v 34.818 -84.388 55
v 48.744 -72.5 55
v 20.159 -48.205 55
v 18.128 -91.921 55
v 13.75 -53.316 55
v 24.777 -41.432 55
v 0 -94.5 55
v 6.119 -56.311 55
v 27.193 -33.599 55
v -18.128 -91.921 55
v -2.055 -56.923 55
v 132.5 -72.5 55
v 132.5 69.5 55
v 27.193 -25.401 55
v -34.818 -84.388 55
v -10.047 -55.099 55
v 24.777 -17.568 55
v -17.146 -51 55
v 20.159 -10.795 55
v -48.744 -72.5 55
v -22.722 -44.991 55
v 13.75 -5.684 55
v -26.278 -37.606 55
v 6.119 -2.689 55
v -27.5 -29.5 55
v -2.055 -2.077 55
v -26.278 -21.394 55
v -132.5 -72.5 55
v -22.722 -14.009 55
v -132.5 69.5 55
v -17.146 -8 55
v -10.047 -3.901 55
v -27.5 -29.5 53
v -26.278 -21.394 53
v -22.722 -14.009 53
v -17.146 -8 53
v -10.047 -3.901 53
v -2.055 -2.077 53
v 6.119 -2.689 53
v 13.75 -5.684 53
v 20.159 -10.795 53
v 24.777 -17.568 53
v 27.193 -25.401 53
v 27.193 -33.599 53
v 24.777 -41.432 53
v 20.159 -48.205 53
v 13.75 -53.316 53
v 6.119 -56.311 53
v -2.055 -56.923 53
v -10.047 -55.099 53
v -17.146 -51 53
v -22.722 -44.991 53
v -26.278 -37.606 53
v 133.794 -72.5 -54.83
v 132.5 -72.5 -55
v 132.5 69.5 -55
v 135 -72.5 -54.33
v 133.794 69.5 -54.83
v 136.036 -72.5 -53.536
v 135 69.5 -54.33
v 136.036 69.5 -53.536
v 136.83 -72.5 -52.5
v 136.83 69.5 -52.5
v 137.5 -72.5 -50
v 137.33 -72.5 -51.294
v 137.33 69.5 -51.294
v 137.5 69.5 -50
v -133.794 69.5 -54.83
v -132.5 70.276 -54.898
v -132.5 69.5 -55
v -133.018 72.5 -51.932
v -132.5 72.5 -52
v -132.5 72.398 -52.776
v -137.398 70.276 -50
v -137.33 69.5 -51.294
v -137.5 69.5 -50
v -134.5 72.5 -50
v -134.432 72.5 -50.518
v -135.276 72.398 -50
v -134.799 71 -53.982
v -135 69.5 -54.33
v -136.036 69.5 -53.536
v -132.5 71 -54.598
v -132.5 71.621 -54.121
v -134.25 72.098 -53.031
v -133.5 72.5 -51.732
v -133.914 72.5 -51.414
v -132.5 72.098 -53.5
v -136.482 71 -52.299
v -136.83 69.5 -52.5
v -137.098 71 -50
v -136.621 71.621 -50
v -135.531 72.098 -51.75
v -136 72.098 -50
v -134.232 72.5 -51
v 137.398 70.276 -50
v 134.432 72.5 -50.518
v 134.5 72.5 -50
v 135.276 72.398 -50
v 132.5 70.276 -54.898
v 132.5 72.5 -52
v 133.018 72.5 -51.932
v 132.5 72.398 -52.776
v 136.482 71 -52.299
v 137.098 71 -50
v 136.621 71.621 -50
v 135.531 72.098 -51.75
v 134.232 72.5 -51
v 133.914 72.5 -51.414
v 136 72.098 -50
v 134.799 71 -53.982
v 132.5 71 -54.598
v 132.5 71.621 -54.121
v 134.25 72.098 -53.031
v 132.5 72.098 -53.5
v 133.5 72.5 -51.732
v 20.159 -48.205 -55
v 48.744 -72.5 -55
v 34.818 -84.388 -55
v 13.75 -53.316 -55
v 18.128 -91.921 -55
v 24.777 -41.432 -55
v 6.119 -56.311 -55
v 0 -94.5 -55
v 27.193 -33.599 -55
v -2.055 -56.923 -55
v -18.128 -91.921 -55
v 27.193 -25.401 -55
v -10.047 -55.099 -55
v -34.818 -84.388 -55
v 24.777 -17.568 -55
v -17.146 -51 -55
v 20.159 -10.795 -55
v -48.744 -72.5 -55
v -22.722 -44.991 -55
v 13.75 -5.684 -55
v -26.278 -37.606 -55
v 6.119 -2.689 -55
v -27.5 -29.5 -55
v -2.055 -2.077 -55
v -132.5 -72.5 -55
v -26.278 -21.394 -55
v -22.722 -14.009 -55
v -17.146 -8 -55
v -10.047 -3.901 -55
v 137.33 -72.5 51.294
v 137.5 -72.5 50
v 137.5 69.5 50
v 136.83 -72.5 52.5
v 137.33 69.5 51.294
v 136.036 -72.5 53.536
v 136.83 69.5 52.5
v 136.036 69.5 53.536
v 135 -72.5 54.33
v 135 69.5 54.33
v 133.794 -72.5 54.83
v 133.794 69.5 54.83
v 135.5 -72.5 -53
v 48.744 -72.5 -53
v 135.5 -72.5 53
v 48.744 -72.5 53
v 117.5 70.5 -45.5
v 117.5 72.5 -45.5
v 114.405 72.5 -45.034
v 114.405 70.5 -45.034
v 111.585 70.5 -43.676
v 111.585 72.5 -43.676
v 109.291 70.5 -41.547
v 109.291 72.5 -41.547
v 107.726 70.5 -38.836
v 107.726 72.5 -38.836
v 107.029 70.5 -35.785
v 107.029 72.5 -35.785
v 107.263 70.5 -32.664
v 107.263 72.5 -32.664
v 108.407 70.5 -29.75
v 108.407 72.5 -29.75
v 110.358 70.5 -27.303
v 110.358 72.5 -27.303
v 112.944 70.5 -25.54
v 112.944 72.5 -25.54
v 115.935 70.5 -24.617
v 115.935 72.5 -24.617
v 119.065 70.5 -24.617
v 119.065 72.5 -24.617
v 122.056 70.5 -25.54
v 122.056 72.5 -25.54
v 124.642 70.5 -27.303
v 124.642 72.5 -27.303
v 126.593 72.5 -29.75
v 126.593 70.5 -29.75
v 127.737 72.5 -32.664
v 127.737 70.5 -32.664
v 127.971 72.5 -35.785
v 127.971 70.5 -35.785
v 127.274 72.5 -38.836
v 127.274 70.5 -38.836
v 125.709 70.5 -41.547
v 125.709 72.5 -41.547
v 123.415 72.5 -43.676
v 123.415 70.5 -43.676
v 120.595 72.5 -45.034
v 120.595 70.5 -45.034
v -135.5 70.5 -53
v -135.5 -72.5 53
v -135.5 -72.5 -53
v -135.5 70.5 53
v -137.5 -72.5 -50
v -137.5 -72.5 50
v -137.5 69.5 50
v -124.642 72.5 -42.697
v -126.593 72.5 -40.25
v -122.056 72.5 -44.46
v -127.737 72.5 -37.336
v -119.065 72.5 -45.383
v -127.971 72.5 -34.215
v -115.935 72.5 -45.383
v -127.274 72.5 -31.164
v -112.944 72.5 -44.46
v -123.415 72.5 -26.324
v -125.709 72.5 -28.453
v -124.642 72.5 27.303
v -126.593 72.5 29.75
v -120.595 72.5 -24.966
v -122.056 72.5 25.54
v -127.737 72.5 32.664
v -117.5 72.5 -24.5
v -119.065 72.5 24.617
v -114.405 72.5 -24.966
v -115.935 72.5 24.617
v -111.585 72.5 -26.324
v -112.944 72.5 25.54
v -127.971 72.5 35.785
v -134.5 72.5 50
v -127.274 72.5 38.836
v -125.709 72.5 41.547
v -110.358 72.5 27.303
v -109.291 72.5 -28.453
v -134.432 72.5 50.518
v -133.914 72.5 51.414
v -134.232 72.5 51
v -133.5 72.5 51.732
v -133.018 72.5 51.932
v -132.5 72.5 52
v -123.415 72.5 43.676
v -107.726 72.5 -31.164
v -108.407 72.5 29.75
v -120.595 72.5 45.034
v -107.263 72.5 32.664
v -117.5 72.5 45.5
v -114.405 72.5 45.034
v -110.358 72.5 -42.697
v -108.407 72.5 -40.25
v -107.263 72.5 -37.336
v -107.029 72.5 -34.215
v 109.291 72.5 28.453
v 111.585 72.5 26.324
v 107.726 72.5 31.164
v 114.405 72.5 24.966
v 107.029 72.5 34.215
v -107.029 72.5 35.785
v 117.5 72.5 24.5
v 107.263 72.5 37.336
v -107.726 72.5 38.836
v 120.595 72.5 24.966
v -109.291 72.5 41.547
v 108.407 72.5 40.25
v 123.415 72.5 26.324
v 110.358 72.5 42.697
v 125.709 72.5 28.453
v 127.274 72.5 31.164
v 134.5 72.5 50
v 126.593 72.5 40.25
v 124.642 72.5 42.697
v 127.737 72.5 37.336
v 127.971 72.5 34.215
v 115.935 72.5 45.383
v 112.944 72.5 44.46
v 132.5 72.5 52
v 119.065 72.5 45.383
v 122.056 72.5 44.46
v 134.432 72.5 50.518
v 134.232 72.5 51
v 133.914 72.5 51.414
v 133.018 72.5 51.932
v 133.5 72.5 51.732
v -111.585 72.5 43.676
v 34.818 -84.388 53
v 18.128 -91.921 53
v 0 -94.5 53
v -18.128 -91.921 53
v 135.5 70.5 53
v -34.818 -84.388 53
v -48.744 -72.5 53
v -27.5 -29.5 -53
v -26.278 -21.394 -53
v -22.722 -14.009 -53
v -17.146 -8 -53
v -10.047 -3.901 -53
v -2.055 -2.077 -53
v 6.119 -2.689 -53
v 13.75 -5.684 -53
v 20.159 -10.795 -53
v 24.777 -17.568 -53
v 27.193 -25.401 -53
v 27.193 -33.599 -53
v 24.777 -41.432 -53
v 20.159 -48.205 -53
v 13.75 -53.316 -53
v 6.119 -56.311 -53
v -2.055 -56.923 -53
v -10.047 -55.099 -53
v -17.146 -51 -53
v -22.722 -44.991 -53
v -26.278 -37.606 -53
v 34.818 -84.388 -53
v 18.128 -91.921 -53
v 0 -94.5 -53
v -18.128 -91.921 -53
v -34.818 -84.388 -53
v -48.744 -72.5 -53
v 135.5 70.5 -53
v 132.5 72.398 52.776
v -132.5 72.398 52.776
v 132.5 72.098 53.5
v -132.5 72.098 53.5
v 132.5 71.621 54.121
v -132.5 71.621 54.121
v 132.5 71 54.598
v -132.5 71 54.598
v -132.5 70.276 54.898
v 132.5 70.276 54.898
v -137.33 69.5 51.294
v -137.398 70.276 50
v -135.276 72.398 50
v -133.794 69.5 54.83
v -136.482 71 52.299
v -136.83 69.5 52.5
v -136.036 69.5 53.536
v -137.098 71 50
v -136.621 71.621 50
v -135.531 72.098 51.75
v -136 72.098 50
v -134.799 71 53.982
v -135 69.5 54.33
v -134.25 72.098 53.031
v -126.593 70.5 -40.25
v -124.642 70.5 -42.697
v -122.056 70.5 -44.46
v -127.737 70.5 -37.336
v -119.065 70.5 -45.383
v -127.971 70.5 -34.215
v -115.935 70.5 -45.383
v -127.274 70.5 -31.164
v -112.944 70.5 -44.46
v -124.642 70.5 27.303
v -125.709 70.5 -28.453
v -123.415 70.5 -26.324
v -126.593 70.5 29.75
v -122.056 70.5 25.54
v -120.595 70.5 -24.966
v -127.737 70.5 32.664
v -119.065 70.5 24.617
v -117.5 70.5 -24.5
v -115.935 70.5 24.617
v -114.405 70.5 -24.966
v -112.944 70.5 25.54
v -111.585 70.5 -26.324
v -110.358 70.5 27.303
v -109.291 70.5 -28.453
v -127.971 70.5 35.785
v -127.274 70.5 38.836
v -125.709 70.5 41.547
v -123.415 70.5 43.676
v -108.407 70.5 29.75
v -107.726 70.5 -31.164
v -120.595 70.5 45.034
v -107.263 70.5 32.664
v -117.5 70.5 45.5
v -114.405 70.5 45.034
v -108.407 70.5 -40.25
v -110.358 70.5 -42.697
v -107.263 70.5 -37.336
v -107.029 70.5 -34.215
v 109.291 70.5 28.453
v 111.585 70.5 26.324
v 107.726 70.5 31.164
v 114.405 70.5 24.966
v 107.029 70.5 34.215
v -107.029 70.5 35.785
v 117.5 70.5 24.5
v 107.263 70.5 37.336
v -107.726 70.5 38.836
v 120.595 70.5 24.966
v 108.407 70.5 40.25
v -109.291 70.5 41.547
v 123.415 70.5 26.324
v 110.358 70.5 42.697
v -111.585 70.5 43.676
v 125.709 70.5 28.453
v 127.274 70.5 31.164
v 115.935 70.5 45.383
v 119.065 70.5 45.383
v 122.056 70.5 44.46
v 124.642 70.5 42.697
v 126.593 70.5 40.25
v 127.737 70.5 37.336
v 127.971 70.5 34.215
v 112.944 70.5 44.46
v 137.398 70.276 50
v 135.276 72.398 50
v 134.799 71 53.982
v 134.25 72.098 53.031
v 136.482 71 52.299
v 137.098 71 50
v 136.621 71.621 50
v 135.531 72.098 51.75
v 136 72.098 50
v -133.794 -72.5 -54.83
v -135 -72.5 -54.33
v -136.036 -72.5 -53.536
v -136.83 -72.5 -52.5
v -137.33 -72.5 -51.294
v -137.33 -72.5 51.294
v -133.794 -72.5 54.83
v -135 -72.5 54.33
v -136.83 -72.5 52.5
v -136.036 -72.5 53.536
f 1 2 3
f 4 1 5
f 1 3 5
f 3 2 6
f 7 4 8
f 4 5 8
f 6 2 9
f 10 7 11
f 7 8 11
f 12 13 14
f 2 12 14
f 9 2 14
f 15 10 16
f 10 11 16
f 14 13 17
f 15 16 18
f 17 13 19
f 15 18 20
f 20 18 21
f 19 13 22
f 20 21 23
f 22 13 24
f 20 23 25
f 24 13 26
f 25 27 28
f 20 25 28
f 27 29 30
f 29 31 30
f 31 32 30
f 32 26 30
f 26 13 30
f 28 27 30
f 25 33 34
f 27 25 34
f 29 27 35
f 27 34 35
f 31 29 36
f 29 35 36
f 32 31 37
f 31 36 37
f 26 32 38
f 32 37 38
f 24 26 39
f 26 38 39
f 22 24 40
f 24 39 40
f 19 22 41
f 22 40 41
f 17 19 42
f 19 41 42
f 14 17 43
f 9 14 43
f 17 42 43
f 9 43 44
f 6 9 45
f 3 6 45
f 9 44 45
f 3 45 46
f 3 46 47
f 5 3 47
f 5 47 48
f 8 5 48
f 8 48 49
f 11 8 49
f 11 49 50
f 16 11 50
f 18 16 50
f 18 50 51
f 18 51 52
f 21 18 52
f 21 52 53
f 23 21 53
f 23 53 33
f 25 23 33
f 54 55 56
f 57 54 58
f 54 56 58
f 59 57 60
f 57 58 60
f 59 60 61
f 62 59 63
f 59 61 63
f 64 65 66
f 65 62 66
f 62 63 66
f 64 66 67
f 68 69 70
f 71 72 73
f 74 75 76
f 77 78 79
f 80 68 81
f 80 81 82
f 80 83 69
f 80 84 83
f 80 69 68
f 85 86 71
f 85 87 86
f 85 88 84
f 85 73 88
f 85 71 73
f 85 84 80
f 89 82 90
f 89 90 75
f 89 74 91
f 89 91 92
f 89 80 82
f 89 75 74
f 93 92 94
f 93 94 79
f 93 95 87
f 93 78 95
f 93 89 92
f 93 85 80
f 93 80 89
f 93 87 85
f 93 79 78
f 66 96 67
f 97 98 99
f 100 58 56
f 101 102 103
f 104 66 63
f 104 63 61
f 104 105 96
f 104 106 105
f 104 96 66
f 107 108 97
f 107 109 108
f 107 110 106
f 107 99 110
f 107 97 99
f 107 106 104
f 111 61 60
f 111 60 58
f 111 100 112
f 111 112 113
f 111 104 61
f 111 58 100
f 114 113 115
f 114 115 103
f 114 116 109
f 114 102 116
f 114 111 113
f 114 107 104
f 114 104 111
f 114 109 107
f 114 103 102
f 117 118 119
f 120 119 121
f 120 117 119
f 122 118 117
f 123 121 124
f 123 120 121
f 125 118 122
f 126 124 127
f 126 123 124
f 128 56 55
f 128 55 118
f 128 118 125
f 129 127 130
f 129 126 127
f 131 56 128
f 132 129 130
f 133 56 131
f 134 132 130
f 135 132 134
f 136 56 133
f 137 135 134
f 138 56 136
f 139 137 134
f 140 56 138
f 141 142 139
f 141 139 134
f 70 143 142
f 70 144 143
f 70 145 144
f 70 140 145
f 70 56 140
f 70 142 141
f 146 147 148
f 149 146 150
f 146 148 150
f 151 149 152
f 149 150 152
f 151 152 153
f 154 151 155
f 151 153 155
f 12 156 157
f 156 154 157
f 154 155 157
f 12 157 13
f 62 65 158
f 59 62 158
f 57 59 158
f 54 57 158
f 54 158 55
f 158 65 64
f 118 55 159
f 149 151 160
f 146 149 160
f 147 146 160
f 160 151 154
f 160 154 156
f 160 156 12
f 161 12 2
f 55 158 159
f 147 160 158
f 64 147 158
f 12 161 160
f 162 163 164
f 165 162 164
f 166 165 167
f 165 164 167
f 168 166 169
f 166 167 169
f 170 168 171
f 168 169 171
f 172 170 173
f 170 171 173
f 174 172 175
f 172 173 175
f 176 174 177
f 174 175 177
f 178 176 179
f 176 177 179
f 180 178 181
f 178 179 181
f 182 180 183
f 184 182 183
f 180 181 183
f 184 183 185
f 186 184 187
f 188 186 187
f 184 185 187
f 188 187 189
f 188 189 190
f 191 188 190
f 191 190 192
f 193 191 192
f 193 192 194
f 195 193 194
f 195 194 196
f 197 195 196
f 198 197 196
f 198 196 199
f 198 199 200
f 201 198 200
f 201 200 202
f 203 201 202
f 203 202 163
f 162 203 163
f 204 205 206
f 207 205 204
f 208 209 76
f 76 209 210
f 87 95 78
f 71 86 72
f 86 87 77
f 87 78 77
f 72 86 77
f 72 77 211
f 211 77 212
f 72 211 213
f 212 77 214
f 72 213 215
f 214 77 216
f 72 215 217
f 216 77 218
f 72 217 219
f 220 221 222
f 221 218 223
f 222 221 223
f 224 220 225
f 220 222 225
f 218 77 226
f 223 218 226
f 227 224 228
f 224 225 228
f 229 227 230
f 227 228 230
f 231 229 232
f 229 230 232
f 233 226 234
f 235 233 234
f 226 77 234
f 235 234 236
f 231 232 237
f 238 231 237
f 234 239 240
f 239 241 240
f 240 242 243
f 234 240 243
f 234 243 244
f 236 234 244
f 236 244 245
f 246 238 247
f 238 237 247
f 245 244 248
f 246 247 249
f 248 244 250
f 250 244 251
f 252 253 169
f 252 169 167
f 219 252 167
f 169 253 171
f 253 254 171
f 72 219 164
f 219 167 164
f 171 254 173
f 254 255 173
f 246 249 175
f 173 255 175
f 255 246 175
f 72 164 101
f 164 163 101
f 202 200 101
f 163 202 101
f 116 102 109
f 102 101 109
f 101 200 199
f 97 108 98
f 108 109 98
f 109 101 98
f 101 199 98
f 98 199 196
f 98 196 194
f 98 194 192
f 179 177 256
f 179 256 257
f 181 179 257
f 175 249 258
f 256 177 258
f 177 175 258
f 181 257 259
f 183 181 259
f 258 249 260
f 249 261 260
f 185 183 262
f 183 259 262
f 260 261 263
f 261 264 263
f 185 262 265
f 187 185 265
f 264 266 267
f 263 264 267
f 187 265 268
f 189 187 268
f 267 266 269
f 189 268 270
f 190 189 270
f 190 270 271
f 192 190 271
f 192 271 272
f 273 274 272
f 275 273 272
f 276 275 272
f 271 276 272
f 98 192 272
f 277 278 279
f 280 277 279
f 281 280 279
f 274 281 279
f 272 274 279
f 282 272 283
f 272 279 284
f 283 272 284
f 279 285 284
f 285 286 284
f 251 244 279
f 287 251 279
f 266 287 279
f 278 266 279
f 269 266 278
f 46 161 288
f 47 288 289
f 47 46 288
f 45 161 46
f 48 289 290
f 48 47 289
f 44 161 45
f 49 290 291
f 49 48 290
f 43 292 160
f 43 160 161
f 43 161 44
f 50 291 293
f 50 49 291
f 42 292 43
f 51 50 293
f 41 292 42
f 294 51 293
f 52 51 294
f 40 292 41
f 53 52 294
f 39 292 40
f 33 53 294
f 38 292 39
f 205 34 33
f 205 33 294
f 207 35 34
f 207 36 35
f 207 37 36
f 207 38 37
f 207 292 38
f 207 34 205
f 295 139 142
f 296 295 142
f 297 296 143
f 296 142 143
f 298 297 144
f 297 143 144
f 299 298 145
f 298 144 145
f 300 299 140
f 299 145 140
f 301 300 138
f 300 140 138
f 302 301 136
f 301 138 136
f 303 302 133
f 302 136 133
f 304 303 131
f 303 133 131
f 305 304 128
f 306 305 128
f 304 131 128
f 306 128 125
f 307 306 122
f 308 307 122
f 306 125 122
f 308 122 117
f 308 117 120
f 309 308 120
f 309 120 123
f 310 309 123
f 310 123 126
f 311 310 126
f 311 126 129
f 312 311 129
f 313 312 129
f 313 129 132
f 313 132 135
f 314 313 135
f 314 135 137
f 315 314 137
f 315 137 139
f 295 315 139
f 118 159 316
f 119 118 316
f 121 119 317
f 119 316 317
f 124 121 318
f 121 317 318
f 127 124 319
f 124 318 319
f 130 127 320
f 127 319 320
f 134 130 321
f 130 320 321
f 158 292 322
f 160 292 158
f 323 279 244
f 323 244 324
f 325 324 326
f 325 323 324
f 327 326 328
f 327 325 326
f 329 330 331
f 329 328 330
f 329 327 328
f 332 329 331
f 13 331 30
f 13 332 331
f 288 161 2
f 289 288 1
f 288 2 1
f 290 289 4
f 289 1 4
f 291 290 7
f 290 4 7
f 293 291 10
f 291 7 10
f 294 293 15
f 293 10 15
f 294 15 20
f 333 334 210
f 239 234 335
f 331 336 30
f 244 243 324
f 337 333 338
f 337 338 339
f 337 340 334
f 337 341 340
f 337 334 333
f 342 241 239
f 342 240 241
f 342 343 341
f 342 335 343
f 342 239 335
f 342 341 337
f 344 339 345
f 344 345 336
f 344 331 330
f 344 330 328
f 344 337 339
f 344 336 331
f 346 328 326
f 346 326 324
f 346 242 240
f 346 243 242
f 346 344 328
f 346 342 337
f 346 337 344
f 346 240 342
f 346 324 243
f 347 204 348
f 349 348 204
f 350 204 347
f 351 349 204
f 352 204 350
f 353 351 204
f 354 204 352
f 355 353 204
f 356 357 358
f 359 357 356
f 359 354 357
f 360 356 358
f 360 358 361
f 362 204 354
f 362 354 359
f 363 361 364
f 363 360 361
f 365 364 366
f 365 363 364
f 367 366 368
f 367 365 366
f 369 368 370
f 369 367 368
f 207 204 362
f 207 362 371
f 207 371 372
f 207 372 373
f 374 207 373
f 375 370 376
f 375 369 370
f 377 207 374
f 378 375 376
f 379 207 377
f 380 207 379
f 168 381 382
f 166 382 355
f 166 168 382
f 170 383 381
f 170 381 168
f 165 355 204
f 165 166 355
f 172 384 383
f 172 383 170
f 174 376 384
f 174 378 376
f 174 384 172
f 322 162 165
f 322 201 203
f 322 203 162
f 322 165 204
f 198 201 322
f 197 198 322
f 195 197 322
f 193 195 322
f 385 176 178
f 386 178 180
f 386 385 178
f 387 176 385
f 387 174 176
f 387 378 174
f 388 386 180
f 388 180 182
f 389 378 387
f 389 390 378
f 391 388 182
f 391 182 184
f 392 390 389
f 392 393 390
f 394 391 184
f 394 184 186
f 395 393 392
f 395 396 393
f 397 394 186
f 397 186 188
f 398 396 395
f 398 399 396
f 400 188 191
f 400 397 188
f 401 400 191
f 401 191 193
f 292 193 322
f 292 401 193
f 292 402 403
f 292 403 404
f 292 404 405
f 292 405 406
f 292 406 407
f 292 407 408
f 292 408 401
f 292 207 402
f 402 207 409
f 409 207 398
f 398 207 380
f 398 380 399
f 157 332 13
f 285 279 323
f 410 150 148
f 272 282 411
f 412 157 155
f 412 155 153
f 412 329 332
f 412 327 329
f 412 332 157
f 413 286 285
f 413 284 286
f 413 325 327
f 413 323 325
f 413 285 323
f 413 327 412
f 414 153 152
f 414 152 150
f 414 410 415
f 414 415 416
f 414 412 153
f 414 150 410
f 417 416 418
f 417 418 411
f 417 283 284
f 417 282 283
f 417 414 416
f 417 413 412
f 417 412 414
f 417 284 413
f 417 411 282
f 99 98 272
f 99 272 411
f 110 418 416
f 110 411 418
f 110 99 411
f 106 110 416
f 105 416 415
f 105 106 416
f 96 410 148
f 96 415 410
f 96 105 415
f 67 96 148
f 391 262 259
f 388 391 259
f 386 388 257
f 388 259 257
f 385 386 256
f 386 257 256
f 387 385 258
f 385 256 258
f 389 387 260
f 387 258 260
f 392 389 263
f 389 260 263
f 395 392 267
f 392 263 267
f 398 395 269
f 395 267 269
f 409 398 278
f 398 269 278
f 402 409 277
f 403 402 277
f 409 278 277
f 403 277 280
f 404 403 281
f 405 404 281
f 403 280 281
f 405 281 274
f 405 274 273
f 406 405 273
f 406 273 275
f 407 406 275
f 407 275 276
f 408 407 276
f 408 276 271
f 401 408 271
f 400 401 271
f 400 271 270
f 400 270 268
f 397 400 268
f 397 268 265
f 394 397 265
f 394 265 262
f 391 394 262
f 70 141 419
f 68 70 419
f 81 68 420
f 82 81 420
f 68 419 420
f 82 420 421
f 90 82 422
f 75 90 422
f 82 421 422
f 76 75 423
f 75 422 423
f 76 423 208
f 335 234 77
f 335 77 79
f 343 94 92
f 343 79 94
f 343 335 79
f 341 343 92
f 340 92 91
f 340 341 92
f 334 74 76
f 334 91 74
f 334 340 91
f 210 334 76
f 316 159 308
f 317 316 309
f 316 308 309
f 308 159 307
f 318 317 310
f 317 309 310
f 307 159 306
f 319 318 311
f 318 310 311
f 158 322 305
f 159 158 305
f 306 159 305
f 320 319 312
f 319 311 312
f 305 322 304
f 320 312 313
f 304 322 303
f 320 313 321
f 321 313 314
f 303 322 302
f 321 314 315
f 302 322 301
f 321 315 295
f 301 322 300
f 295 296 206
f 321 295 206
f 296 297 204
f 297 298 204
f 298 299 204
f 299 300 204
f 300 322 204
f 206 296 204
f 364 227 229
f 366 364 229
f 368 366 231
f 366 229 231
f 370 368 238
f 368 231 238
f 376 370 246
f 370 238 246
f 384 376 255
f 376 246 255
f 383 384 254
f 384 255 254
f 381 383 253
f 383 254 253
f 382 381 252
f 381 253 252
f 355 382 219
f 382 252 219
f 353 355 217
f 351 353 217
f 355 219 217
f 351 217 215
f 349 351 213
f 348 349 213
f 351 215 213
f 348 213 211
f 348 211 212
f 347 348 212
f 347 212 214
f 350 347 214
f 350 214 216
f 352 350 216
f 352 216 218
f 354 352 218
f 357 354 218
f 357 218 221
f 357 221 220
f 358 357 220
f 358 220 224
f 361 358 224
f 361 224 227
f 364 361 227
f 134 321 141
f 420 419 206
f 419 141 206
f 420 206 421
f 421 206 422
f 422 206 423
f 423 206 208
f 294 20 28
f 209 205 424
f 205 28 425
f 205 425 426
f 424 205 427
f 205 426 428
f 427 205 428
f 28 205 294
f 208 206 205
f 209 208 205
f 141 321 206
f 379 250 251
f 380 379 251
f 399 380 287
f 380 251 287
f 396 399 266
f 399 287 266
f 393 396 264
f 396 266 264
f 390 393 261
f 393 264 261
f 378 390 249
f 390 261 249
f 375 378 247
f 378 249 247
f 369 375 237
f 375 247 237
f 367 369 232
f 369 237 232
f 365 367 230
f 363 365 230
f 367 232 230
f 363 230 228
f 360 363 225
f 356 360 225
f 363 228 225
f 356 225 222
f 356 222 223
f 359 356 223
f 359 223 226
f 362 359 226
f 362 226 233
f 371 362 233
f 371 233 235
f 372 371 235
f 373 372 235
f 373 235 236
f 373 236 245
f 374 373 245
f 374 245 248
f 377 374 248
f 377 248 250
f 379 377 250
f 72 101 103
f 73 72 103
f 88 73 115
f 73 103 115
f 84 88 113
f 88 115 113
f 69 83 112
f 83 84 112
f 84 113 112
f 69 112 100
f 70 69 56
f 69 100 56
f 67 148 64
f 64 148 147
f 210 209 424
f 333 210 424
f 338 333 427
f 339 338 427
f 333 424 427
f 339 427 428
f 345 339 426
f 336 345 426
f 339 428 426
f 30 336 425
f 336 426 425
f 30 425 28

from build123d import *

# Parameters (mm, degrees)
BOSS_EXTRU_1_DEPTH      = 55
COQUE1_T                = -2
ESQUISSE2_R             = 27.5
ENL_V_MAT_EXTRU_1_DEPTH = 200.841186946
ESQUISSE3_R             = 10.5
ENL_V_MAT_EXTRU_2_DEPTH = 224.204502643
CONG_2_R                = 3
CONG_3_R                = 5


with BuildPart() as part:
    # Esquisse1 → Boss.-Extru.1 (new, symmetric)
    with BuildSketch(Plane.XY):
        with BuildLine():
            Line((-137.5, 72.5), (137.5, 72.5))
            Line((137.5, 72.5), (137.5, -72.5))
            Line((137.5, -72.5), (48.744230428, -72.5))
            ThreePointArc((48.744230428, -72.5), (0, -94.5), (-48.744230428, -72.5))
            Line((-48.744230428, -72.5), (-137.5, -72.5))
            Line((-137.5, -72.5), (-137.5, 72.5))
        make_face()
    extrude(amount=BOSS_EXTRU_1_DEPTH, both=True)

    # Coque1
    coque1_openings = [part.faces().sort_by_distance(p)[0] for p in [
        (93.122115214, -72.5, 0),
        (0, -94.5, 0),
        (-93.122115214, -72.5, 0),
    ]]
    offset(amount=COQUE1_T, openings=coque1_openings, kind=Kind.INTERSECTION)

    # Esquisse2 → Enlèv. mat.-Extru.1 (cut, through all)
    with BuildSketch(Plane(origin=(0, 0, -55), x_dir=(-1, 0, 0), z_dir=(0, 0, -1))):
        with Locations((0, -29.5)):
            Circle(ESQUISSE2_R)
    extrude(amount=-ENL_V_MAT_EXTRU_1_DEPTH, mode=Mode.SUBTRACT)

    # Esquisse3 → Enlèv. mat.-Extru.2 (cut, through all)
    with BuildSketch(Plane(origin=(0, 72.5, 0), x_dir=(1, 0, 0), z_dir=(0, 1, 0))):
        with Locations(Location((-117.5, 35, 0), (0, 0, 270))):
            Circle(ESQUISSE3_R)
        with Locations(Location((-117.5, -35, 0), (0, 0, 270))):
            Circle(ESQUISSE3_R)
        with Locations(Location((117.5, 35, 0), (0, 0, 90))):
            Circle(ESQUISSE3_R)
        with Locations(Location((117.5, -35, 0), (0, 0, 90))):
            Circle(ESQUISSE3_R)
    extrude(amount=-ENL_V_MAT_EXTRU_2_DEPTH, mode=Mode.SUBTRACT)

    # Congé2
    cong_2_edges = [part.edges().sort_by_distance(p)[0] for p in [
        (-137.5, 72.5, 0),
        (137.5, 72.5, 0),
        (0, 72.5, 55),
        (0, 72.5, -55),
    ]]
    fillet(cong_2_edges, radius=CONG_2_R)

    # Congé3
    # the kernel refuses this fillet: 5 mm, written as the material it takes off along each edge
    with BuildSketch(Plane(origin=(-132.5, 72.5, 50), x_dir=(-1, 0, 0), z_dir=(0, 0, -1))) as cong_3_piece_1:
        with BuildLine():
            CenterArc((2, -3), 3, 0, 90)
            Line((5, -3), (5, 0))
            Line((5, 0), (2, 0))
        make_face()
    revolve(axis=Axis((-132.5, 72.5, 50), (0, 1, 0)), revolution_arc=90, mode=Mode.SUBTRACT)
    with BuildSketch(Plane(origin=(-132.5, 72.5, -50), x_dir=(0, 0, -1), z_dir=(1, 0, 0))) as cong_3_piece_2:
        with BuildLine():
            CenterArc((2, -3), 3, 0, 90)
            Line((5, -3), (5, 0))
            Line((5, 0), (2, 0))
        make_face()
    revolve(axis=Axis((-132.5, 72.5, -50), (0, 1, 0)), revolution_arc=90, mode=Mode.SUBTRACT)
    with BuildSketch(Plane(origin=(132.5, 72.5, 50), x_dir=(0, 0, 1), z_dir=(-1, 0, 0))) as cong_3_piece_3:
        with BuildLine():
            CenterArc((2, -3), 3, 0, 90)
            Line((5, -3), (5, 0))
            Line((5, 0), (2, 0))
        make_face()
    revolve(axis=Axis((132.5, 72.5, 50), (0, 1, 0)), revolution_arc=90, mode=Mode.SUBTRACT)
    with BuildSketch(Plane(origin=(132.5, 72.5, -50), x_dir=(1, 0, 0), z_dir=(0, 0, 1))) as cong_3_piece_4:
        with BuildLine():
            CenterArc((2, -3), 3, 0, 90)
            Line((5, -3), (5, 0))
            Line((5, 0), (2, 0))
        make_face()
    revolve(axis=Axis((132.5, 72.5, -50), (0, 1, 0)), revolution_arc=90, mode=Mode.SUBTRACT)
    with BuildSketch(Plane(origin=(137.5, 72.5, 55), x_dir=(-1, 0, 0), z_dir=(0, -1, 0)), Plane(origin=(137.5, 72.5, -55), x_dir=(0, 0, 1), z_dir=(0, -1, 0)), Plane(origin=(-137.5, -85, -55), x_dir=(0, 0, 1), z_dir=(0, 1, 0)), Plane(origin=(-137.5, -85, 55), x_dir=(1, 0, 0), z_dir=(0, 1, 0))) as cong_3_piece_5:
        with BuildLine():
            CenterArc((CONG_3_R, CONG_3_R), CONG_3_R, 180, 90)
            Line((0, CONG_3_R), (0, 0))
            Line((0, 0), (CONG_3_R, 0))
        make_face()
    extrude(amount=157.5, mode=Mode.SUBTRACT)


solid = part.part
